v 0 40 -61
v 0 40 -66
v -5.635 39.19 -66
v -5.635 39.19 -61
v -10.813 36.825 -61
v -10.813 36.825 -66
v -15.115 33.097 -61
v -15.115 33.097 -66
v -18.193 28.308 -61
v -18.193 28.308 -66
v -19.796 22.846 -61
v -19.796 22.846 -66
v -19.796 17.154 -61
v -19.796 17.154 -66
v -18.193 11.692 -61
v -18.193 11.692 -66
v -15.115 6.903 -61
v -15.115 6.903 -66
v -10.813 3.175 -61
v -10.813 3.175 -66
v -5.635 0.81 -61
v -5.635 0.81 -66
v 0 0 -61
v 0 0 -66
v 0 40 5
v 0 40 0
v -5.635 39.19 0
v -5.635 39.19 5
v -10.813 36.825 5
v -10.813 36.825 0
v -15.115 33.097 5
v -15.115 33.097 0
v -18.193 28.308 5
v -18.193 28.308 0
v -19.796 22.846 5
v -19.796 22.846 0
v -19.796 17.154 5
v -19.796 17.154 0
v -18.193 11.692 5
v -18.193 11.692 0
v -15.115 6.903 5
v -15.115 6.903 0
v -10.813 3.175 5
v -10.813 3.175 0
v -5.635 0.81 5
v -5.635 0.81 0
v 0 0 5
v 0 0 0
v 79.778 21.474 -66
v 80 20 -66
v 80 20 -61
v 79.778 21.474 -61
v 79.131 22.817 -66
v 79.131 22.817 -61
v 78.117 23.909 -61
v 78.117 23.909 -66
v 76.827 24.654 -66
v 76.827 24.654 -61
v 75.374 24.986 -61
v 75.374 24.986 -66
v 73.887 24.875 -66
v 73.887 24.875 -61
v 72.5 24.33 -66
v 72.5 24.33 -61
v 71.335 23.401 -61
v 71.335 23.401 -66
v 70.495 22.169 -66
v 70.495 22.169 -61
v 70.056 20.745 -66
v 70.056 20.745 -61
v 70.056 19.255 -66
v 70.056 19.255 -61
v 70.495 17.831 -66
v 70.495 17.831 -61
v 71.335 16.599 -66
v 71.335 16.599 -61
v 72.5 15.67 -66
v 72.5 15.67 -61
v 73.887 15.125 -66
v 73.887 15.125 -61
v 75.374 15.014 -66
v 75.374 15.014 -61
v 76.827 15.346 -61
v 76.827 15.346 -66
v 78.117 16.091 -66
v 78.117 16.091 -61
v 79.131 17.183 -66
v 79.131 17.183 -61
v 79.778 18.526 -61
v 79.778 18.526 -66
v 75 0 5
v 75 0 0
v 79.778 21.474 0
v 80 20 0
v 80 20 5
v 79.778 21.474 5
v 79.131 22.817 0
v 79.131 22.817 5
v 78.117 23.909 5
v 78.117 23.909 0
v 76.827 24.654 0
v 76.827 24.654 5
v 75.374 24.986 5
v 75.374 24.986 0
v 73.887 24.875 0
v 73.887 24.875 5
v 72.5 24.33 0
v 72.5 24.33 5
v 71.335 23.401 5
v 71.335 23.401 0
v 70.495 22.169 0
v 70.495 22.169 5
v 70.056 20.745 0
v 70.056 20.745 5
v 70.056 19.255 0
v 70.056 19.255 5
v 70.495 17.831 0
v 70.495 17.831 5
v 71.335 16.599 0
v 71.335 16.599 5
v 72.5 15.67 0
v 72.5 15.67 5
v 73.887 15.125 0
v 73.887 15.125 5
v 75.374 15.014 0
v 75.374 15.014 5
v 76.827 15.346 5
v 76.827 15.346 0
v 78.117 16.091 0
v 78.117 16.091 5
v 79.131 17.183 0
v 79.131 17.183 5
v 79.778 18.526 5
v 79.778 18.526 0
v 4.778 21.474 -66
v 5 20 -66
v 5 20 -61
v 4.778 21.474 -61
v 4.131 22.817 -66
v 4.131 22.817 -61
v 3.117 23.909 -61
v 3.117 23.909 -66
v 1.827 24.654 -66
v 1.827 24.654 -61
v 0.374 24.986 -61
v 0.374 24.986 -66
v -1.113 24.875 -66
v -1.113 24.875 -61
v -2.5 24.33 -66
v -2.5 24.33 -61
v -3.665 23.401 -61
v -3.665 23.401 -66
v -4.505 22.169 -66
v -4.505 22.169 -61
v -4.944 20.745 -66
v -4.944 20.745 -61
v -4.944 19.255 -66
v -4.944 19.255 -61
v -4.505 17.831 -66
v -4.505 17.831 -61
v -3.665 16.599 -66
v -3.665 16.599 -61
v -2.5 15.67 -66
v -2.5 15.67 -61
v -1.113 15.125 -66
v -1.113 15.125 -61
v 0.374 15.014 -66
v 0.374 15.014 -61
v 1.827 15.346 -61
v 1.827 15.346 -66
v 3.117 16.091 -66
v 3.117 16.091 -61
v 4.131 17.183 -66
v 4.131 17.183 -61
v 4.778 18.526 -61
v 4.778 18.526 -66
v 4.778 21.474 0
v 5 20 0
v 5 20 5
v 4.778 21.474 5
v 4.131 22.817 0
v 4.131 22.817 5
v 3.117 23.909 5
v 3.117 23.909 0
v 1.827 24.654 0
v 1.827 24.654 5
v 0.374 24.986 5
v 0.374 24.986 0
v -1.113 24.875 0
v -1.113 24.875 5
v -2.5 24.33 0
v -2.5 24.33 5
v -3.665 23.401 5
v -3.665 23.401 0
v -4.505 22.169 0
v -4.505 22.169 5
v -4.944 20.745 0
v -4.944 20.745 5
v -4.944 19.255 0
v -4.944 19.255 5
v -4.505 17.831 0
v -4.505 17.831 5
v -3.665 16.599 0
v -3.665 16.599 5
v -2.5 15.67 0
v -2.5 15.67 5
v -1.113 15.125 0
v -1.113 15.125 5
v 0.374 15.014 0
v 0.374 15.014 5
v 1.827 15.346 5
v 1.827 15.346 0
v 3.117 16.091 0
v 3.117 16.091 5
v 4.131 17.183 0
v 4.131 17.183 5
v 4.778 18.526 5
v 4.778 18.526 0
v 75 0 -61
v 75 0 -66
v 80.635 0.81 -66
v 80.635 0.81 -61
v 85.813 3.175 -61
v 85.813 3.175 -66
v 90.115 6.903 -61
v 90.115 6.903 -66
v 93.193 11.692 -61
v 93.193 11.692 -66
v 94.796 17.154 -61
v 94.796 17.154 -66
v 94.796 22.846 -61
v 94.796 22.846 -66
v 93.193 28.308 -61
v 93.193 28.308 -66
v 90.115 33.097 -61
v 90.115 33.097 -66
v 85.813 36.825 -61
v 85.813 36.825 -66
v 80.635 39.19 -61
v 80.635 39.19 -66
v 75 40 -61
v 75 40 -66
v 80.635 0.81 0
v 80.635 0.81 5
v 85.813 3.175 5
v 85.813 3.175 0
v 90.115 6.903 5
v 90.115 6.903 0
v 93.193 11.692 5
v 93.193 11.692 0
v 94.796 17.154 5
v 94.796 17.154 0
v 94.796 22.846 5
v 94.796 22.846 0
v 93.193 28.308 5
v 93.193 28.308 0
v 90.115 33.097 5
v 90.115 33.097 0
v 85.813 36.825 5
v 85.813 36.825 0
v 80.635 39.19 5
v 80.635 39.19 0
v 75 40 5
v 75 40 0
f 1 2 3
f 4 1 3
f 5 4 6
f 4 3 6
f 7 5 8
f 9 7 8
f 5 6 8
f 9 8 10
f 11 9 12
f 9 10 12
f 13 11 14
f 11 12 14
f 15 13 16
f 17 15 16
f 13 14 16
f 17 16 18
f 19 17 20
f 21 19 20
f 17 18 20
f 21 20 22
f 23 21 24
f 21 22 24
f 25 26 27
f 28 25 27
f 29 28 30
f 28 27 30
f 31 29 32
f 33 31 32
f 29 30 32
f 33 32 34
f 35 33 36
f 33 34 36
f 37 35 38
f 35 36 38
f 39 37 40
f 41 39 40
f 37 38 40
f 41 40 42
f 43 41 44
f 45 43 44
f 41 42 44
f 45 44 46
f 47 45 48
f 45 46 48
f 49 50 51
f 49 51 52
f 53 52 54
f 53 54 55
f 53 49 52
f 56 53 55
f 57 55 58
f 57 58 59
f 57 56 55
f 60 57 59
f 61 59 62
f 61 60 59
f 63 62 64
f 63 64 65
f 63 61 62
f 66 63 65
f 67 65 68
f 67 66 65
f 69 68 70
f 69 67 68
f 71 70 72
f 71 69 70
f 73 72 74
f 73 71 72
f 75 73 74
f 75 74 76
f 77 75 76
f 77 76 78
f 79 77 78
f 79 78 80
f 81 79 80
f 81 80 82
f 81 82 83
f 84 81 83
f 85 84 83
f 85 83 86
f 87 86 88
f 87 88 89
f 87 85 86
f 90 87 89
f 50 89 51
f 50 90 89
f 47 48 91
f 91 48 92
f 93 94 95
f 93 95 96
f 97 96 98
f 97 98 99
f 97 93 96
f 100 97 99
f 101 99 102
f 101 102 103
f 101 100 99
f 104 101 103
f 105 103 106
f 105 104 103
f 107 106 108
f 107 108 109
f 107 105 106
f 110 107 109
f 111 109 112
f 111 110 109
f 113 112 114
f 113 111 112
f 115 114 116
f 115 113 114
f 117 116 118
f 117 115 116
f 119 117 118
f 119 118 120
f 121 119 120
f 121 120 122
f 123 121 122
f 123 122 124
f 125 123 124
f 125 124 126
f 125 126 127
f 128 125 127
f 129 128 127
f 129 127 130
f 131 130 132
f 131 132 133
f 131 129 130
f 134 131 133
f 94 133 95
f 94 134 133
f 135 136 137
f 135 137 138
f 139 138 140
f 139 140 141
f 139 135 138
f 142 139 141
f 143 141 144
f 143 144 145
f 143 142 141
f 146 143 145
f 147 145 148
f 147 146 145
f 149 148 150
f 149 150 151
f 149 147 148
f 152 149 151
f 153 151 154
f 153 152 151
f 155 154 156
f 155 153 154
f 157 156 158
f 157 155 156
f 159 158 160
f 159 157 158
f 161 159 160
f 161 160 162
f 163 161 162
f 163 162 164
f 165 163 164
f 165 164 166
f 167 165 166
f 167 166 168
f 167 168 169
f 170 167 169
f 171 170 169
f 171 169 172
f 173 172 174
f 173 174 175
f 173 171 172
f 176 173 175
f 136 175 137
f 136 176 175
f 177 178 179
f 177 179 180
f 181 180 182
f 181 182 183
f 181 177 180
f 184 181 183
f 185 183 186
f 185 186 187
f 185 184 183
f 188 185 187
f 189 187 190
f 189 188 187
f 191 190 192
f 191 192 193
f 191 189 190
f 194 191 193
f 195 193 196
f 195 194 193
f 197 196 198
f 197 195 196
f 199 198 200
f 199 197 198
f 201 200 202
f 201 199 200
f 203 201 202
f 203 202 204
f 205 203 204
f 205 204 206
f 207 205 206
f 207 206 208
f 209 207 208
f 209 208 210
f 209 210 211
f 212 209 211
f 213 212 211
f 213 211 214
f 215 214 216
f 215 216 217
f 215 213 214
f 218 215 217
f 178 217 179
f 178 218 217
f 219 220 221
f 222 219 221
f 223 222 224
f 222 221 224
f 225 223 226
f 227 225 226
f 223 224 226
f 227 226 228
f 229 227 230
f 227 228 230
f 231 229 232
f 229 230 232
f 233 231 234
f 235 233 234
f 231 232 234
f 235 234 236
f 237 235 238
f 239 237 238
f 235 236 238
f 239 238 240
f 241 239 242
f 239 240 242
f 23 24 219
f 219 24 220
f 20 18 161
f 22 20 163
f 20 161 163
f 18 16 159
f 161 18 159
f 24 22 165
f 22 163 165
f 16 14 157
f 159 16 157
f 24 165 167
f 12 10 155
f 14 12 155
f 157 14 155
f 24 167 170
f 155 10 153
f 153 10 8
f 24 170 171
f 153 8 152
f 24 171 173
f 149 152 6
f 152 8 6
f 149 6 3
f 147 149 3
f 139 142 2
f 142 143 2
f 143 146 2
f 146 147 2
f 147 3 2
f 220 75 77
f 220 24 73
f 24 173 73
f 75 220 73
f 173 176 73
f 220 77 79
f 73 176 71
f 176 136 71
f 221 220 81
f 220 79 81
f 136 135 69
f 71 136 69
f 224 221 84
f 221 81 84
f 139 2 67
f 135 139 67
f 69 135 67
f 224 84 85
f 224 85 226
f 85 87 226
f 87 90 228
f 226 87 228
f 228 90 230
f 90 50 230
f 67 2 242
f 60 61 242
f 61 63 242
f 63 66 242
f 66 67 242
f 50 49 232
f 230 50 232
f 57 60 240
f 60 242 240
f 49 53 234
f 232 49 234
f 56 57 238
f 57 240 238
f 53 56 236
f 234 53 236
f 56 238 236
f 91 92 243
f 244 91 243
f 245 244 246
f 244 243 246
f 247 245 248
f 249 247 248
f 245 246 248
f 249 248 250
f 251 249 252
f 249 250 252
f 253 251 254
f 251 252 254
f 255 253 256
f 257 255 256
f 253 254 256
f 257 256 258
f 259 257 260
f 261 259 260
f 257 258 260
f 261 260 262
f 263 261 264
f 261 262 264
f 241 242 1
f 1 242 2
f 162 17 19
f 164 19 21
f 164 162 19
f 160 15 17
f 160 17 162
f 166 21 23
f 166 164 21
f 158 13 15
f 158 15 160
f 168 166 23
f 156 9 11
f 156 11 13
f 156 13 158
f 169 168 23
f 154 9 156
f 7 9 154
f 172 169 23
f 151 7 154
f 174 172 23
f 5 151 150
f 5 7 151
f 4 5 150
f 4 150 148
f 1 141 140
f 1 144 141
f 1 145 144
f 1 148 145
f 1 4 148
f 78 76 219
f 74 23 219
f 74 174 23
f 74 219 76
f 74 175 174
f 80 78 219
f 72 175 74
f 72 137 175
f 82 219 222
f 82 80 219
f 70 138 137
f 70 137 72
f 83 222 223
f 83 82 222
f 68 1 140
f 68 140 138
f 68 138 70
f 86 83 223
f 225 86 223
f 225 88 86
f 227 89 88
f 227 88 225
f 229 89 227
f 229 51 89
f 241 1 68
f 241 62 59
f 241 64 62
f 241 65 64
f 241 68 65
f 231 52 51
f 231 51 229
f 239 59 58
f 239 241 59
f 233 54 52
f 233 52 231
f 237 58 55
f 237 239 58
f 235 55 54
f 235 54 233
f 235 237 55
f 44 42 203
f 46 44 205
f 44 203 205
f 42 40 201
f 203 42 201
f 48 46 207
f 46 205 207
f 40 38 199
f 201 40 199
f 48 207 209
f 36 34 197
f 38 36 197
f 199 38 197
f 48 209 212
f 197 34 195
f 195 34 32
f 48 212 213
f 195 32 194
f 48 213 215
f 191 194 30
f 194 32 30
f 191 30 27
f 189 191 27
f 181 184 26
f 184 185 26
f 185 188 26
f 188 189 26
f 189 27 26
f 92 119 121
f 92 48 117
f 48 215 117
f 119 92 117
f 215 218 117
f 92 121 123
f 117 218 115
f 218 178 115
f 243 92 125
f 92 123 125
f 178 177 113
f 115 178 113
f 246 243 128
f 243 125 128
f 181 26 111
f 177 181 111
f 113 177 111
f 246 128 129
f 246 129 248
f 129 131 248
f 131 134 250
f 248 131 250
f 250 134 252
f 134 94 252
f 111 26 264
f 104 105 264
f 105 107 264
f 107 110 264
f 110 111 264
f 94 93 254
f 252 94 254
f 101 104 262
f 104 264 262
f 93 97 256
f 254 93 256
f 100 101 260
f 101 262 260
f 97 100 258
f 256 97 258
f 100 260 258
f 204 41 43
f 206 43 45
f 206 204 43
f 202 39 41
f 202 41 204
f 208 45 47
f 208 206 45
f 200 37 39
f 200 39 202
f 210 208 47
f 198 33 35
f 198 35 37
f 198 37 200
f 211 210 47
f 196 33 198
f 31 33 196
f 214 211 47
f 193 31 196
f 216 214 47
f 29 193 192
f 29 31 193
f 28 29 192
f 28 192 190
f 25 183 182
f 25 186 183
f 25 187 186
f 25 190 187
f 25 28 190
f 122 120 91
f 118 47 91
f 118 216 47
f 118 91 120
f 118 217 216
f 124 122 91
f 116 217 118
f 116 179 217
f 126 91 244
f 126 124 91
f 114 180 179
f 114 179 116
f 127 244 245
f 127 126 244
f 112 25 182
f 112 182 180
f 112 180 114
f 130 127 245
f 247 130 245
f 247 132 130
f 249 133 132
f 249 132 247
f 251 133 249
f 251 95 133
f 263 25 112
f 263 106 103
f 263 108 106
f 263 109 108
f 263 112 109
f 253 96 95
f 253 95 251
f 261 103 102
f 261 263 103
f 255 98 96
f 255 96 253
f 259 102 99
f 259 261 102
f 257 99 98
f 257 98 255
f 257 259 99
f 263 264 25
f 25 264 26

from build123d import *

# Parameters (mm, degrees)
ESQUISSE1_R                = 5
BOSS_EXTRU_1_DEPTH         = 5
R_P_TITION_LIN_AIRE1_COUNT = 2
R_P_TITION_LIN_AIRE1_PITCH = 66


with BuildPart() as part:
    # Esquisse1 → Boss.-Extru.1 (new body)
    with BuildSketch(Plane.XY):
        with BuildLine():
            Line((0, 0), (75, 0))
            ThreePointArc((75, 0), (95, 20), (75, 40))
            Line((75, 40), (0, 40))
            ThreePointArc((0, 40), (-20, 20), (0, 0))
        make_face()
        with Locations((0, 20)):
            Circle(ESQUISSE1_R, mode=Mode.SUBTRACT)
        with Locations((75, 20)):
            Circle(ESQUISSE1_R, mode=Mode.SUBTRACT)
    extrude(amount=BOSS_EXTRU_1_DEPTH)


with BuildPart() as r_p_tition_lin_aire1_1:
    # Répétition linéaire1: pattern copy
    add(part.part.moved(Location(Vector(0, 0, -1) * (1 * R_P_TITION_LIN_AIRE1_PITCH))))


solid = Compound([part.part, r_p_tition_lin_aire1_1.part])
